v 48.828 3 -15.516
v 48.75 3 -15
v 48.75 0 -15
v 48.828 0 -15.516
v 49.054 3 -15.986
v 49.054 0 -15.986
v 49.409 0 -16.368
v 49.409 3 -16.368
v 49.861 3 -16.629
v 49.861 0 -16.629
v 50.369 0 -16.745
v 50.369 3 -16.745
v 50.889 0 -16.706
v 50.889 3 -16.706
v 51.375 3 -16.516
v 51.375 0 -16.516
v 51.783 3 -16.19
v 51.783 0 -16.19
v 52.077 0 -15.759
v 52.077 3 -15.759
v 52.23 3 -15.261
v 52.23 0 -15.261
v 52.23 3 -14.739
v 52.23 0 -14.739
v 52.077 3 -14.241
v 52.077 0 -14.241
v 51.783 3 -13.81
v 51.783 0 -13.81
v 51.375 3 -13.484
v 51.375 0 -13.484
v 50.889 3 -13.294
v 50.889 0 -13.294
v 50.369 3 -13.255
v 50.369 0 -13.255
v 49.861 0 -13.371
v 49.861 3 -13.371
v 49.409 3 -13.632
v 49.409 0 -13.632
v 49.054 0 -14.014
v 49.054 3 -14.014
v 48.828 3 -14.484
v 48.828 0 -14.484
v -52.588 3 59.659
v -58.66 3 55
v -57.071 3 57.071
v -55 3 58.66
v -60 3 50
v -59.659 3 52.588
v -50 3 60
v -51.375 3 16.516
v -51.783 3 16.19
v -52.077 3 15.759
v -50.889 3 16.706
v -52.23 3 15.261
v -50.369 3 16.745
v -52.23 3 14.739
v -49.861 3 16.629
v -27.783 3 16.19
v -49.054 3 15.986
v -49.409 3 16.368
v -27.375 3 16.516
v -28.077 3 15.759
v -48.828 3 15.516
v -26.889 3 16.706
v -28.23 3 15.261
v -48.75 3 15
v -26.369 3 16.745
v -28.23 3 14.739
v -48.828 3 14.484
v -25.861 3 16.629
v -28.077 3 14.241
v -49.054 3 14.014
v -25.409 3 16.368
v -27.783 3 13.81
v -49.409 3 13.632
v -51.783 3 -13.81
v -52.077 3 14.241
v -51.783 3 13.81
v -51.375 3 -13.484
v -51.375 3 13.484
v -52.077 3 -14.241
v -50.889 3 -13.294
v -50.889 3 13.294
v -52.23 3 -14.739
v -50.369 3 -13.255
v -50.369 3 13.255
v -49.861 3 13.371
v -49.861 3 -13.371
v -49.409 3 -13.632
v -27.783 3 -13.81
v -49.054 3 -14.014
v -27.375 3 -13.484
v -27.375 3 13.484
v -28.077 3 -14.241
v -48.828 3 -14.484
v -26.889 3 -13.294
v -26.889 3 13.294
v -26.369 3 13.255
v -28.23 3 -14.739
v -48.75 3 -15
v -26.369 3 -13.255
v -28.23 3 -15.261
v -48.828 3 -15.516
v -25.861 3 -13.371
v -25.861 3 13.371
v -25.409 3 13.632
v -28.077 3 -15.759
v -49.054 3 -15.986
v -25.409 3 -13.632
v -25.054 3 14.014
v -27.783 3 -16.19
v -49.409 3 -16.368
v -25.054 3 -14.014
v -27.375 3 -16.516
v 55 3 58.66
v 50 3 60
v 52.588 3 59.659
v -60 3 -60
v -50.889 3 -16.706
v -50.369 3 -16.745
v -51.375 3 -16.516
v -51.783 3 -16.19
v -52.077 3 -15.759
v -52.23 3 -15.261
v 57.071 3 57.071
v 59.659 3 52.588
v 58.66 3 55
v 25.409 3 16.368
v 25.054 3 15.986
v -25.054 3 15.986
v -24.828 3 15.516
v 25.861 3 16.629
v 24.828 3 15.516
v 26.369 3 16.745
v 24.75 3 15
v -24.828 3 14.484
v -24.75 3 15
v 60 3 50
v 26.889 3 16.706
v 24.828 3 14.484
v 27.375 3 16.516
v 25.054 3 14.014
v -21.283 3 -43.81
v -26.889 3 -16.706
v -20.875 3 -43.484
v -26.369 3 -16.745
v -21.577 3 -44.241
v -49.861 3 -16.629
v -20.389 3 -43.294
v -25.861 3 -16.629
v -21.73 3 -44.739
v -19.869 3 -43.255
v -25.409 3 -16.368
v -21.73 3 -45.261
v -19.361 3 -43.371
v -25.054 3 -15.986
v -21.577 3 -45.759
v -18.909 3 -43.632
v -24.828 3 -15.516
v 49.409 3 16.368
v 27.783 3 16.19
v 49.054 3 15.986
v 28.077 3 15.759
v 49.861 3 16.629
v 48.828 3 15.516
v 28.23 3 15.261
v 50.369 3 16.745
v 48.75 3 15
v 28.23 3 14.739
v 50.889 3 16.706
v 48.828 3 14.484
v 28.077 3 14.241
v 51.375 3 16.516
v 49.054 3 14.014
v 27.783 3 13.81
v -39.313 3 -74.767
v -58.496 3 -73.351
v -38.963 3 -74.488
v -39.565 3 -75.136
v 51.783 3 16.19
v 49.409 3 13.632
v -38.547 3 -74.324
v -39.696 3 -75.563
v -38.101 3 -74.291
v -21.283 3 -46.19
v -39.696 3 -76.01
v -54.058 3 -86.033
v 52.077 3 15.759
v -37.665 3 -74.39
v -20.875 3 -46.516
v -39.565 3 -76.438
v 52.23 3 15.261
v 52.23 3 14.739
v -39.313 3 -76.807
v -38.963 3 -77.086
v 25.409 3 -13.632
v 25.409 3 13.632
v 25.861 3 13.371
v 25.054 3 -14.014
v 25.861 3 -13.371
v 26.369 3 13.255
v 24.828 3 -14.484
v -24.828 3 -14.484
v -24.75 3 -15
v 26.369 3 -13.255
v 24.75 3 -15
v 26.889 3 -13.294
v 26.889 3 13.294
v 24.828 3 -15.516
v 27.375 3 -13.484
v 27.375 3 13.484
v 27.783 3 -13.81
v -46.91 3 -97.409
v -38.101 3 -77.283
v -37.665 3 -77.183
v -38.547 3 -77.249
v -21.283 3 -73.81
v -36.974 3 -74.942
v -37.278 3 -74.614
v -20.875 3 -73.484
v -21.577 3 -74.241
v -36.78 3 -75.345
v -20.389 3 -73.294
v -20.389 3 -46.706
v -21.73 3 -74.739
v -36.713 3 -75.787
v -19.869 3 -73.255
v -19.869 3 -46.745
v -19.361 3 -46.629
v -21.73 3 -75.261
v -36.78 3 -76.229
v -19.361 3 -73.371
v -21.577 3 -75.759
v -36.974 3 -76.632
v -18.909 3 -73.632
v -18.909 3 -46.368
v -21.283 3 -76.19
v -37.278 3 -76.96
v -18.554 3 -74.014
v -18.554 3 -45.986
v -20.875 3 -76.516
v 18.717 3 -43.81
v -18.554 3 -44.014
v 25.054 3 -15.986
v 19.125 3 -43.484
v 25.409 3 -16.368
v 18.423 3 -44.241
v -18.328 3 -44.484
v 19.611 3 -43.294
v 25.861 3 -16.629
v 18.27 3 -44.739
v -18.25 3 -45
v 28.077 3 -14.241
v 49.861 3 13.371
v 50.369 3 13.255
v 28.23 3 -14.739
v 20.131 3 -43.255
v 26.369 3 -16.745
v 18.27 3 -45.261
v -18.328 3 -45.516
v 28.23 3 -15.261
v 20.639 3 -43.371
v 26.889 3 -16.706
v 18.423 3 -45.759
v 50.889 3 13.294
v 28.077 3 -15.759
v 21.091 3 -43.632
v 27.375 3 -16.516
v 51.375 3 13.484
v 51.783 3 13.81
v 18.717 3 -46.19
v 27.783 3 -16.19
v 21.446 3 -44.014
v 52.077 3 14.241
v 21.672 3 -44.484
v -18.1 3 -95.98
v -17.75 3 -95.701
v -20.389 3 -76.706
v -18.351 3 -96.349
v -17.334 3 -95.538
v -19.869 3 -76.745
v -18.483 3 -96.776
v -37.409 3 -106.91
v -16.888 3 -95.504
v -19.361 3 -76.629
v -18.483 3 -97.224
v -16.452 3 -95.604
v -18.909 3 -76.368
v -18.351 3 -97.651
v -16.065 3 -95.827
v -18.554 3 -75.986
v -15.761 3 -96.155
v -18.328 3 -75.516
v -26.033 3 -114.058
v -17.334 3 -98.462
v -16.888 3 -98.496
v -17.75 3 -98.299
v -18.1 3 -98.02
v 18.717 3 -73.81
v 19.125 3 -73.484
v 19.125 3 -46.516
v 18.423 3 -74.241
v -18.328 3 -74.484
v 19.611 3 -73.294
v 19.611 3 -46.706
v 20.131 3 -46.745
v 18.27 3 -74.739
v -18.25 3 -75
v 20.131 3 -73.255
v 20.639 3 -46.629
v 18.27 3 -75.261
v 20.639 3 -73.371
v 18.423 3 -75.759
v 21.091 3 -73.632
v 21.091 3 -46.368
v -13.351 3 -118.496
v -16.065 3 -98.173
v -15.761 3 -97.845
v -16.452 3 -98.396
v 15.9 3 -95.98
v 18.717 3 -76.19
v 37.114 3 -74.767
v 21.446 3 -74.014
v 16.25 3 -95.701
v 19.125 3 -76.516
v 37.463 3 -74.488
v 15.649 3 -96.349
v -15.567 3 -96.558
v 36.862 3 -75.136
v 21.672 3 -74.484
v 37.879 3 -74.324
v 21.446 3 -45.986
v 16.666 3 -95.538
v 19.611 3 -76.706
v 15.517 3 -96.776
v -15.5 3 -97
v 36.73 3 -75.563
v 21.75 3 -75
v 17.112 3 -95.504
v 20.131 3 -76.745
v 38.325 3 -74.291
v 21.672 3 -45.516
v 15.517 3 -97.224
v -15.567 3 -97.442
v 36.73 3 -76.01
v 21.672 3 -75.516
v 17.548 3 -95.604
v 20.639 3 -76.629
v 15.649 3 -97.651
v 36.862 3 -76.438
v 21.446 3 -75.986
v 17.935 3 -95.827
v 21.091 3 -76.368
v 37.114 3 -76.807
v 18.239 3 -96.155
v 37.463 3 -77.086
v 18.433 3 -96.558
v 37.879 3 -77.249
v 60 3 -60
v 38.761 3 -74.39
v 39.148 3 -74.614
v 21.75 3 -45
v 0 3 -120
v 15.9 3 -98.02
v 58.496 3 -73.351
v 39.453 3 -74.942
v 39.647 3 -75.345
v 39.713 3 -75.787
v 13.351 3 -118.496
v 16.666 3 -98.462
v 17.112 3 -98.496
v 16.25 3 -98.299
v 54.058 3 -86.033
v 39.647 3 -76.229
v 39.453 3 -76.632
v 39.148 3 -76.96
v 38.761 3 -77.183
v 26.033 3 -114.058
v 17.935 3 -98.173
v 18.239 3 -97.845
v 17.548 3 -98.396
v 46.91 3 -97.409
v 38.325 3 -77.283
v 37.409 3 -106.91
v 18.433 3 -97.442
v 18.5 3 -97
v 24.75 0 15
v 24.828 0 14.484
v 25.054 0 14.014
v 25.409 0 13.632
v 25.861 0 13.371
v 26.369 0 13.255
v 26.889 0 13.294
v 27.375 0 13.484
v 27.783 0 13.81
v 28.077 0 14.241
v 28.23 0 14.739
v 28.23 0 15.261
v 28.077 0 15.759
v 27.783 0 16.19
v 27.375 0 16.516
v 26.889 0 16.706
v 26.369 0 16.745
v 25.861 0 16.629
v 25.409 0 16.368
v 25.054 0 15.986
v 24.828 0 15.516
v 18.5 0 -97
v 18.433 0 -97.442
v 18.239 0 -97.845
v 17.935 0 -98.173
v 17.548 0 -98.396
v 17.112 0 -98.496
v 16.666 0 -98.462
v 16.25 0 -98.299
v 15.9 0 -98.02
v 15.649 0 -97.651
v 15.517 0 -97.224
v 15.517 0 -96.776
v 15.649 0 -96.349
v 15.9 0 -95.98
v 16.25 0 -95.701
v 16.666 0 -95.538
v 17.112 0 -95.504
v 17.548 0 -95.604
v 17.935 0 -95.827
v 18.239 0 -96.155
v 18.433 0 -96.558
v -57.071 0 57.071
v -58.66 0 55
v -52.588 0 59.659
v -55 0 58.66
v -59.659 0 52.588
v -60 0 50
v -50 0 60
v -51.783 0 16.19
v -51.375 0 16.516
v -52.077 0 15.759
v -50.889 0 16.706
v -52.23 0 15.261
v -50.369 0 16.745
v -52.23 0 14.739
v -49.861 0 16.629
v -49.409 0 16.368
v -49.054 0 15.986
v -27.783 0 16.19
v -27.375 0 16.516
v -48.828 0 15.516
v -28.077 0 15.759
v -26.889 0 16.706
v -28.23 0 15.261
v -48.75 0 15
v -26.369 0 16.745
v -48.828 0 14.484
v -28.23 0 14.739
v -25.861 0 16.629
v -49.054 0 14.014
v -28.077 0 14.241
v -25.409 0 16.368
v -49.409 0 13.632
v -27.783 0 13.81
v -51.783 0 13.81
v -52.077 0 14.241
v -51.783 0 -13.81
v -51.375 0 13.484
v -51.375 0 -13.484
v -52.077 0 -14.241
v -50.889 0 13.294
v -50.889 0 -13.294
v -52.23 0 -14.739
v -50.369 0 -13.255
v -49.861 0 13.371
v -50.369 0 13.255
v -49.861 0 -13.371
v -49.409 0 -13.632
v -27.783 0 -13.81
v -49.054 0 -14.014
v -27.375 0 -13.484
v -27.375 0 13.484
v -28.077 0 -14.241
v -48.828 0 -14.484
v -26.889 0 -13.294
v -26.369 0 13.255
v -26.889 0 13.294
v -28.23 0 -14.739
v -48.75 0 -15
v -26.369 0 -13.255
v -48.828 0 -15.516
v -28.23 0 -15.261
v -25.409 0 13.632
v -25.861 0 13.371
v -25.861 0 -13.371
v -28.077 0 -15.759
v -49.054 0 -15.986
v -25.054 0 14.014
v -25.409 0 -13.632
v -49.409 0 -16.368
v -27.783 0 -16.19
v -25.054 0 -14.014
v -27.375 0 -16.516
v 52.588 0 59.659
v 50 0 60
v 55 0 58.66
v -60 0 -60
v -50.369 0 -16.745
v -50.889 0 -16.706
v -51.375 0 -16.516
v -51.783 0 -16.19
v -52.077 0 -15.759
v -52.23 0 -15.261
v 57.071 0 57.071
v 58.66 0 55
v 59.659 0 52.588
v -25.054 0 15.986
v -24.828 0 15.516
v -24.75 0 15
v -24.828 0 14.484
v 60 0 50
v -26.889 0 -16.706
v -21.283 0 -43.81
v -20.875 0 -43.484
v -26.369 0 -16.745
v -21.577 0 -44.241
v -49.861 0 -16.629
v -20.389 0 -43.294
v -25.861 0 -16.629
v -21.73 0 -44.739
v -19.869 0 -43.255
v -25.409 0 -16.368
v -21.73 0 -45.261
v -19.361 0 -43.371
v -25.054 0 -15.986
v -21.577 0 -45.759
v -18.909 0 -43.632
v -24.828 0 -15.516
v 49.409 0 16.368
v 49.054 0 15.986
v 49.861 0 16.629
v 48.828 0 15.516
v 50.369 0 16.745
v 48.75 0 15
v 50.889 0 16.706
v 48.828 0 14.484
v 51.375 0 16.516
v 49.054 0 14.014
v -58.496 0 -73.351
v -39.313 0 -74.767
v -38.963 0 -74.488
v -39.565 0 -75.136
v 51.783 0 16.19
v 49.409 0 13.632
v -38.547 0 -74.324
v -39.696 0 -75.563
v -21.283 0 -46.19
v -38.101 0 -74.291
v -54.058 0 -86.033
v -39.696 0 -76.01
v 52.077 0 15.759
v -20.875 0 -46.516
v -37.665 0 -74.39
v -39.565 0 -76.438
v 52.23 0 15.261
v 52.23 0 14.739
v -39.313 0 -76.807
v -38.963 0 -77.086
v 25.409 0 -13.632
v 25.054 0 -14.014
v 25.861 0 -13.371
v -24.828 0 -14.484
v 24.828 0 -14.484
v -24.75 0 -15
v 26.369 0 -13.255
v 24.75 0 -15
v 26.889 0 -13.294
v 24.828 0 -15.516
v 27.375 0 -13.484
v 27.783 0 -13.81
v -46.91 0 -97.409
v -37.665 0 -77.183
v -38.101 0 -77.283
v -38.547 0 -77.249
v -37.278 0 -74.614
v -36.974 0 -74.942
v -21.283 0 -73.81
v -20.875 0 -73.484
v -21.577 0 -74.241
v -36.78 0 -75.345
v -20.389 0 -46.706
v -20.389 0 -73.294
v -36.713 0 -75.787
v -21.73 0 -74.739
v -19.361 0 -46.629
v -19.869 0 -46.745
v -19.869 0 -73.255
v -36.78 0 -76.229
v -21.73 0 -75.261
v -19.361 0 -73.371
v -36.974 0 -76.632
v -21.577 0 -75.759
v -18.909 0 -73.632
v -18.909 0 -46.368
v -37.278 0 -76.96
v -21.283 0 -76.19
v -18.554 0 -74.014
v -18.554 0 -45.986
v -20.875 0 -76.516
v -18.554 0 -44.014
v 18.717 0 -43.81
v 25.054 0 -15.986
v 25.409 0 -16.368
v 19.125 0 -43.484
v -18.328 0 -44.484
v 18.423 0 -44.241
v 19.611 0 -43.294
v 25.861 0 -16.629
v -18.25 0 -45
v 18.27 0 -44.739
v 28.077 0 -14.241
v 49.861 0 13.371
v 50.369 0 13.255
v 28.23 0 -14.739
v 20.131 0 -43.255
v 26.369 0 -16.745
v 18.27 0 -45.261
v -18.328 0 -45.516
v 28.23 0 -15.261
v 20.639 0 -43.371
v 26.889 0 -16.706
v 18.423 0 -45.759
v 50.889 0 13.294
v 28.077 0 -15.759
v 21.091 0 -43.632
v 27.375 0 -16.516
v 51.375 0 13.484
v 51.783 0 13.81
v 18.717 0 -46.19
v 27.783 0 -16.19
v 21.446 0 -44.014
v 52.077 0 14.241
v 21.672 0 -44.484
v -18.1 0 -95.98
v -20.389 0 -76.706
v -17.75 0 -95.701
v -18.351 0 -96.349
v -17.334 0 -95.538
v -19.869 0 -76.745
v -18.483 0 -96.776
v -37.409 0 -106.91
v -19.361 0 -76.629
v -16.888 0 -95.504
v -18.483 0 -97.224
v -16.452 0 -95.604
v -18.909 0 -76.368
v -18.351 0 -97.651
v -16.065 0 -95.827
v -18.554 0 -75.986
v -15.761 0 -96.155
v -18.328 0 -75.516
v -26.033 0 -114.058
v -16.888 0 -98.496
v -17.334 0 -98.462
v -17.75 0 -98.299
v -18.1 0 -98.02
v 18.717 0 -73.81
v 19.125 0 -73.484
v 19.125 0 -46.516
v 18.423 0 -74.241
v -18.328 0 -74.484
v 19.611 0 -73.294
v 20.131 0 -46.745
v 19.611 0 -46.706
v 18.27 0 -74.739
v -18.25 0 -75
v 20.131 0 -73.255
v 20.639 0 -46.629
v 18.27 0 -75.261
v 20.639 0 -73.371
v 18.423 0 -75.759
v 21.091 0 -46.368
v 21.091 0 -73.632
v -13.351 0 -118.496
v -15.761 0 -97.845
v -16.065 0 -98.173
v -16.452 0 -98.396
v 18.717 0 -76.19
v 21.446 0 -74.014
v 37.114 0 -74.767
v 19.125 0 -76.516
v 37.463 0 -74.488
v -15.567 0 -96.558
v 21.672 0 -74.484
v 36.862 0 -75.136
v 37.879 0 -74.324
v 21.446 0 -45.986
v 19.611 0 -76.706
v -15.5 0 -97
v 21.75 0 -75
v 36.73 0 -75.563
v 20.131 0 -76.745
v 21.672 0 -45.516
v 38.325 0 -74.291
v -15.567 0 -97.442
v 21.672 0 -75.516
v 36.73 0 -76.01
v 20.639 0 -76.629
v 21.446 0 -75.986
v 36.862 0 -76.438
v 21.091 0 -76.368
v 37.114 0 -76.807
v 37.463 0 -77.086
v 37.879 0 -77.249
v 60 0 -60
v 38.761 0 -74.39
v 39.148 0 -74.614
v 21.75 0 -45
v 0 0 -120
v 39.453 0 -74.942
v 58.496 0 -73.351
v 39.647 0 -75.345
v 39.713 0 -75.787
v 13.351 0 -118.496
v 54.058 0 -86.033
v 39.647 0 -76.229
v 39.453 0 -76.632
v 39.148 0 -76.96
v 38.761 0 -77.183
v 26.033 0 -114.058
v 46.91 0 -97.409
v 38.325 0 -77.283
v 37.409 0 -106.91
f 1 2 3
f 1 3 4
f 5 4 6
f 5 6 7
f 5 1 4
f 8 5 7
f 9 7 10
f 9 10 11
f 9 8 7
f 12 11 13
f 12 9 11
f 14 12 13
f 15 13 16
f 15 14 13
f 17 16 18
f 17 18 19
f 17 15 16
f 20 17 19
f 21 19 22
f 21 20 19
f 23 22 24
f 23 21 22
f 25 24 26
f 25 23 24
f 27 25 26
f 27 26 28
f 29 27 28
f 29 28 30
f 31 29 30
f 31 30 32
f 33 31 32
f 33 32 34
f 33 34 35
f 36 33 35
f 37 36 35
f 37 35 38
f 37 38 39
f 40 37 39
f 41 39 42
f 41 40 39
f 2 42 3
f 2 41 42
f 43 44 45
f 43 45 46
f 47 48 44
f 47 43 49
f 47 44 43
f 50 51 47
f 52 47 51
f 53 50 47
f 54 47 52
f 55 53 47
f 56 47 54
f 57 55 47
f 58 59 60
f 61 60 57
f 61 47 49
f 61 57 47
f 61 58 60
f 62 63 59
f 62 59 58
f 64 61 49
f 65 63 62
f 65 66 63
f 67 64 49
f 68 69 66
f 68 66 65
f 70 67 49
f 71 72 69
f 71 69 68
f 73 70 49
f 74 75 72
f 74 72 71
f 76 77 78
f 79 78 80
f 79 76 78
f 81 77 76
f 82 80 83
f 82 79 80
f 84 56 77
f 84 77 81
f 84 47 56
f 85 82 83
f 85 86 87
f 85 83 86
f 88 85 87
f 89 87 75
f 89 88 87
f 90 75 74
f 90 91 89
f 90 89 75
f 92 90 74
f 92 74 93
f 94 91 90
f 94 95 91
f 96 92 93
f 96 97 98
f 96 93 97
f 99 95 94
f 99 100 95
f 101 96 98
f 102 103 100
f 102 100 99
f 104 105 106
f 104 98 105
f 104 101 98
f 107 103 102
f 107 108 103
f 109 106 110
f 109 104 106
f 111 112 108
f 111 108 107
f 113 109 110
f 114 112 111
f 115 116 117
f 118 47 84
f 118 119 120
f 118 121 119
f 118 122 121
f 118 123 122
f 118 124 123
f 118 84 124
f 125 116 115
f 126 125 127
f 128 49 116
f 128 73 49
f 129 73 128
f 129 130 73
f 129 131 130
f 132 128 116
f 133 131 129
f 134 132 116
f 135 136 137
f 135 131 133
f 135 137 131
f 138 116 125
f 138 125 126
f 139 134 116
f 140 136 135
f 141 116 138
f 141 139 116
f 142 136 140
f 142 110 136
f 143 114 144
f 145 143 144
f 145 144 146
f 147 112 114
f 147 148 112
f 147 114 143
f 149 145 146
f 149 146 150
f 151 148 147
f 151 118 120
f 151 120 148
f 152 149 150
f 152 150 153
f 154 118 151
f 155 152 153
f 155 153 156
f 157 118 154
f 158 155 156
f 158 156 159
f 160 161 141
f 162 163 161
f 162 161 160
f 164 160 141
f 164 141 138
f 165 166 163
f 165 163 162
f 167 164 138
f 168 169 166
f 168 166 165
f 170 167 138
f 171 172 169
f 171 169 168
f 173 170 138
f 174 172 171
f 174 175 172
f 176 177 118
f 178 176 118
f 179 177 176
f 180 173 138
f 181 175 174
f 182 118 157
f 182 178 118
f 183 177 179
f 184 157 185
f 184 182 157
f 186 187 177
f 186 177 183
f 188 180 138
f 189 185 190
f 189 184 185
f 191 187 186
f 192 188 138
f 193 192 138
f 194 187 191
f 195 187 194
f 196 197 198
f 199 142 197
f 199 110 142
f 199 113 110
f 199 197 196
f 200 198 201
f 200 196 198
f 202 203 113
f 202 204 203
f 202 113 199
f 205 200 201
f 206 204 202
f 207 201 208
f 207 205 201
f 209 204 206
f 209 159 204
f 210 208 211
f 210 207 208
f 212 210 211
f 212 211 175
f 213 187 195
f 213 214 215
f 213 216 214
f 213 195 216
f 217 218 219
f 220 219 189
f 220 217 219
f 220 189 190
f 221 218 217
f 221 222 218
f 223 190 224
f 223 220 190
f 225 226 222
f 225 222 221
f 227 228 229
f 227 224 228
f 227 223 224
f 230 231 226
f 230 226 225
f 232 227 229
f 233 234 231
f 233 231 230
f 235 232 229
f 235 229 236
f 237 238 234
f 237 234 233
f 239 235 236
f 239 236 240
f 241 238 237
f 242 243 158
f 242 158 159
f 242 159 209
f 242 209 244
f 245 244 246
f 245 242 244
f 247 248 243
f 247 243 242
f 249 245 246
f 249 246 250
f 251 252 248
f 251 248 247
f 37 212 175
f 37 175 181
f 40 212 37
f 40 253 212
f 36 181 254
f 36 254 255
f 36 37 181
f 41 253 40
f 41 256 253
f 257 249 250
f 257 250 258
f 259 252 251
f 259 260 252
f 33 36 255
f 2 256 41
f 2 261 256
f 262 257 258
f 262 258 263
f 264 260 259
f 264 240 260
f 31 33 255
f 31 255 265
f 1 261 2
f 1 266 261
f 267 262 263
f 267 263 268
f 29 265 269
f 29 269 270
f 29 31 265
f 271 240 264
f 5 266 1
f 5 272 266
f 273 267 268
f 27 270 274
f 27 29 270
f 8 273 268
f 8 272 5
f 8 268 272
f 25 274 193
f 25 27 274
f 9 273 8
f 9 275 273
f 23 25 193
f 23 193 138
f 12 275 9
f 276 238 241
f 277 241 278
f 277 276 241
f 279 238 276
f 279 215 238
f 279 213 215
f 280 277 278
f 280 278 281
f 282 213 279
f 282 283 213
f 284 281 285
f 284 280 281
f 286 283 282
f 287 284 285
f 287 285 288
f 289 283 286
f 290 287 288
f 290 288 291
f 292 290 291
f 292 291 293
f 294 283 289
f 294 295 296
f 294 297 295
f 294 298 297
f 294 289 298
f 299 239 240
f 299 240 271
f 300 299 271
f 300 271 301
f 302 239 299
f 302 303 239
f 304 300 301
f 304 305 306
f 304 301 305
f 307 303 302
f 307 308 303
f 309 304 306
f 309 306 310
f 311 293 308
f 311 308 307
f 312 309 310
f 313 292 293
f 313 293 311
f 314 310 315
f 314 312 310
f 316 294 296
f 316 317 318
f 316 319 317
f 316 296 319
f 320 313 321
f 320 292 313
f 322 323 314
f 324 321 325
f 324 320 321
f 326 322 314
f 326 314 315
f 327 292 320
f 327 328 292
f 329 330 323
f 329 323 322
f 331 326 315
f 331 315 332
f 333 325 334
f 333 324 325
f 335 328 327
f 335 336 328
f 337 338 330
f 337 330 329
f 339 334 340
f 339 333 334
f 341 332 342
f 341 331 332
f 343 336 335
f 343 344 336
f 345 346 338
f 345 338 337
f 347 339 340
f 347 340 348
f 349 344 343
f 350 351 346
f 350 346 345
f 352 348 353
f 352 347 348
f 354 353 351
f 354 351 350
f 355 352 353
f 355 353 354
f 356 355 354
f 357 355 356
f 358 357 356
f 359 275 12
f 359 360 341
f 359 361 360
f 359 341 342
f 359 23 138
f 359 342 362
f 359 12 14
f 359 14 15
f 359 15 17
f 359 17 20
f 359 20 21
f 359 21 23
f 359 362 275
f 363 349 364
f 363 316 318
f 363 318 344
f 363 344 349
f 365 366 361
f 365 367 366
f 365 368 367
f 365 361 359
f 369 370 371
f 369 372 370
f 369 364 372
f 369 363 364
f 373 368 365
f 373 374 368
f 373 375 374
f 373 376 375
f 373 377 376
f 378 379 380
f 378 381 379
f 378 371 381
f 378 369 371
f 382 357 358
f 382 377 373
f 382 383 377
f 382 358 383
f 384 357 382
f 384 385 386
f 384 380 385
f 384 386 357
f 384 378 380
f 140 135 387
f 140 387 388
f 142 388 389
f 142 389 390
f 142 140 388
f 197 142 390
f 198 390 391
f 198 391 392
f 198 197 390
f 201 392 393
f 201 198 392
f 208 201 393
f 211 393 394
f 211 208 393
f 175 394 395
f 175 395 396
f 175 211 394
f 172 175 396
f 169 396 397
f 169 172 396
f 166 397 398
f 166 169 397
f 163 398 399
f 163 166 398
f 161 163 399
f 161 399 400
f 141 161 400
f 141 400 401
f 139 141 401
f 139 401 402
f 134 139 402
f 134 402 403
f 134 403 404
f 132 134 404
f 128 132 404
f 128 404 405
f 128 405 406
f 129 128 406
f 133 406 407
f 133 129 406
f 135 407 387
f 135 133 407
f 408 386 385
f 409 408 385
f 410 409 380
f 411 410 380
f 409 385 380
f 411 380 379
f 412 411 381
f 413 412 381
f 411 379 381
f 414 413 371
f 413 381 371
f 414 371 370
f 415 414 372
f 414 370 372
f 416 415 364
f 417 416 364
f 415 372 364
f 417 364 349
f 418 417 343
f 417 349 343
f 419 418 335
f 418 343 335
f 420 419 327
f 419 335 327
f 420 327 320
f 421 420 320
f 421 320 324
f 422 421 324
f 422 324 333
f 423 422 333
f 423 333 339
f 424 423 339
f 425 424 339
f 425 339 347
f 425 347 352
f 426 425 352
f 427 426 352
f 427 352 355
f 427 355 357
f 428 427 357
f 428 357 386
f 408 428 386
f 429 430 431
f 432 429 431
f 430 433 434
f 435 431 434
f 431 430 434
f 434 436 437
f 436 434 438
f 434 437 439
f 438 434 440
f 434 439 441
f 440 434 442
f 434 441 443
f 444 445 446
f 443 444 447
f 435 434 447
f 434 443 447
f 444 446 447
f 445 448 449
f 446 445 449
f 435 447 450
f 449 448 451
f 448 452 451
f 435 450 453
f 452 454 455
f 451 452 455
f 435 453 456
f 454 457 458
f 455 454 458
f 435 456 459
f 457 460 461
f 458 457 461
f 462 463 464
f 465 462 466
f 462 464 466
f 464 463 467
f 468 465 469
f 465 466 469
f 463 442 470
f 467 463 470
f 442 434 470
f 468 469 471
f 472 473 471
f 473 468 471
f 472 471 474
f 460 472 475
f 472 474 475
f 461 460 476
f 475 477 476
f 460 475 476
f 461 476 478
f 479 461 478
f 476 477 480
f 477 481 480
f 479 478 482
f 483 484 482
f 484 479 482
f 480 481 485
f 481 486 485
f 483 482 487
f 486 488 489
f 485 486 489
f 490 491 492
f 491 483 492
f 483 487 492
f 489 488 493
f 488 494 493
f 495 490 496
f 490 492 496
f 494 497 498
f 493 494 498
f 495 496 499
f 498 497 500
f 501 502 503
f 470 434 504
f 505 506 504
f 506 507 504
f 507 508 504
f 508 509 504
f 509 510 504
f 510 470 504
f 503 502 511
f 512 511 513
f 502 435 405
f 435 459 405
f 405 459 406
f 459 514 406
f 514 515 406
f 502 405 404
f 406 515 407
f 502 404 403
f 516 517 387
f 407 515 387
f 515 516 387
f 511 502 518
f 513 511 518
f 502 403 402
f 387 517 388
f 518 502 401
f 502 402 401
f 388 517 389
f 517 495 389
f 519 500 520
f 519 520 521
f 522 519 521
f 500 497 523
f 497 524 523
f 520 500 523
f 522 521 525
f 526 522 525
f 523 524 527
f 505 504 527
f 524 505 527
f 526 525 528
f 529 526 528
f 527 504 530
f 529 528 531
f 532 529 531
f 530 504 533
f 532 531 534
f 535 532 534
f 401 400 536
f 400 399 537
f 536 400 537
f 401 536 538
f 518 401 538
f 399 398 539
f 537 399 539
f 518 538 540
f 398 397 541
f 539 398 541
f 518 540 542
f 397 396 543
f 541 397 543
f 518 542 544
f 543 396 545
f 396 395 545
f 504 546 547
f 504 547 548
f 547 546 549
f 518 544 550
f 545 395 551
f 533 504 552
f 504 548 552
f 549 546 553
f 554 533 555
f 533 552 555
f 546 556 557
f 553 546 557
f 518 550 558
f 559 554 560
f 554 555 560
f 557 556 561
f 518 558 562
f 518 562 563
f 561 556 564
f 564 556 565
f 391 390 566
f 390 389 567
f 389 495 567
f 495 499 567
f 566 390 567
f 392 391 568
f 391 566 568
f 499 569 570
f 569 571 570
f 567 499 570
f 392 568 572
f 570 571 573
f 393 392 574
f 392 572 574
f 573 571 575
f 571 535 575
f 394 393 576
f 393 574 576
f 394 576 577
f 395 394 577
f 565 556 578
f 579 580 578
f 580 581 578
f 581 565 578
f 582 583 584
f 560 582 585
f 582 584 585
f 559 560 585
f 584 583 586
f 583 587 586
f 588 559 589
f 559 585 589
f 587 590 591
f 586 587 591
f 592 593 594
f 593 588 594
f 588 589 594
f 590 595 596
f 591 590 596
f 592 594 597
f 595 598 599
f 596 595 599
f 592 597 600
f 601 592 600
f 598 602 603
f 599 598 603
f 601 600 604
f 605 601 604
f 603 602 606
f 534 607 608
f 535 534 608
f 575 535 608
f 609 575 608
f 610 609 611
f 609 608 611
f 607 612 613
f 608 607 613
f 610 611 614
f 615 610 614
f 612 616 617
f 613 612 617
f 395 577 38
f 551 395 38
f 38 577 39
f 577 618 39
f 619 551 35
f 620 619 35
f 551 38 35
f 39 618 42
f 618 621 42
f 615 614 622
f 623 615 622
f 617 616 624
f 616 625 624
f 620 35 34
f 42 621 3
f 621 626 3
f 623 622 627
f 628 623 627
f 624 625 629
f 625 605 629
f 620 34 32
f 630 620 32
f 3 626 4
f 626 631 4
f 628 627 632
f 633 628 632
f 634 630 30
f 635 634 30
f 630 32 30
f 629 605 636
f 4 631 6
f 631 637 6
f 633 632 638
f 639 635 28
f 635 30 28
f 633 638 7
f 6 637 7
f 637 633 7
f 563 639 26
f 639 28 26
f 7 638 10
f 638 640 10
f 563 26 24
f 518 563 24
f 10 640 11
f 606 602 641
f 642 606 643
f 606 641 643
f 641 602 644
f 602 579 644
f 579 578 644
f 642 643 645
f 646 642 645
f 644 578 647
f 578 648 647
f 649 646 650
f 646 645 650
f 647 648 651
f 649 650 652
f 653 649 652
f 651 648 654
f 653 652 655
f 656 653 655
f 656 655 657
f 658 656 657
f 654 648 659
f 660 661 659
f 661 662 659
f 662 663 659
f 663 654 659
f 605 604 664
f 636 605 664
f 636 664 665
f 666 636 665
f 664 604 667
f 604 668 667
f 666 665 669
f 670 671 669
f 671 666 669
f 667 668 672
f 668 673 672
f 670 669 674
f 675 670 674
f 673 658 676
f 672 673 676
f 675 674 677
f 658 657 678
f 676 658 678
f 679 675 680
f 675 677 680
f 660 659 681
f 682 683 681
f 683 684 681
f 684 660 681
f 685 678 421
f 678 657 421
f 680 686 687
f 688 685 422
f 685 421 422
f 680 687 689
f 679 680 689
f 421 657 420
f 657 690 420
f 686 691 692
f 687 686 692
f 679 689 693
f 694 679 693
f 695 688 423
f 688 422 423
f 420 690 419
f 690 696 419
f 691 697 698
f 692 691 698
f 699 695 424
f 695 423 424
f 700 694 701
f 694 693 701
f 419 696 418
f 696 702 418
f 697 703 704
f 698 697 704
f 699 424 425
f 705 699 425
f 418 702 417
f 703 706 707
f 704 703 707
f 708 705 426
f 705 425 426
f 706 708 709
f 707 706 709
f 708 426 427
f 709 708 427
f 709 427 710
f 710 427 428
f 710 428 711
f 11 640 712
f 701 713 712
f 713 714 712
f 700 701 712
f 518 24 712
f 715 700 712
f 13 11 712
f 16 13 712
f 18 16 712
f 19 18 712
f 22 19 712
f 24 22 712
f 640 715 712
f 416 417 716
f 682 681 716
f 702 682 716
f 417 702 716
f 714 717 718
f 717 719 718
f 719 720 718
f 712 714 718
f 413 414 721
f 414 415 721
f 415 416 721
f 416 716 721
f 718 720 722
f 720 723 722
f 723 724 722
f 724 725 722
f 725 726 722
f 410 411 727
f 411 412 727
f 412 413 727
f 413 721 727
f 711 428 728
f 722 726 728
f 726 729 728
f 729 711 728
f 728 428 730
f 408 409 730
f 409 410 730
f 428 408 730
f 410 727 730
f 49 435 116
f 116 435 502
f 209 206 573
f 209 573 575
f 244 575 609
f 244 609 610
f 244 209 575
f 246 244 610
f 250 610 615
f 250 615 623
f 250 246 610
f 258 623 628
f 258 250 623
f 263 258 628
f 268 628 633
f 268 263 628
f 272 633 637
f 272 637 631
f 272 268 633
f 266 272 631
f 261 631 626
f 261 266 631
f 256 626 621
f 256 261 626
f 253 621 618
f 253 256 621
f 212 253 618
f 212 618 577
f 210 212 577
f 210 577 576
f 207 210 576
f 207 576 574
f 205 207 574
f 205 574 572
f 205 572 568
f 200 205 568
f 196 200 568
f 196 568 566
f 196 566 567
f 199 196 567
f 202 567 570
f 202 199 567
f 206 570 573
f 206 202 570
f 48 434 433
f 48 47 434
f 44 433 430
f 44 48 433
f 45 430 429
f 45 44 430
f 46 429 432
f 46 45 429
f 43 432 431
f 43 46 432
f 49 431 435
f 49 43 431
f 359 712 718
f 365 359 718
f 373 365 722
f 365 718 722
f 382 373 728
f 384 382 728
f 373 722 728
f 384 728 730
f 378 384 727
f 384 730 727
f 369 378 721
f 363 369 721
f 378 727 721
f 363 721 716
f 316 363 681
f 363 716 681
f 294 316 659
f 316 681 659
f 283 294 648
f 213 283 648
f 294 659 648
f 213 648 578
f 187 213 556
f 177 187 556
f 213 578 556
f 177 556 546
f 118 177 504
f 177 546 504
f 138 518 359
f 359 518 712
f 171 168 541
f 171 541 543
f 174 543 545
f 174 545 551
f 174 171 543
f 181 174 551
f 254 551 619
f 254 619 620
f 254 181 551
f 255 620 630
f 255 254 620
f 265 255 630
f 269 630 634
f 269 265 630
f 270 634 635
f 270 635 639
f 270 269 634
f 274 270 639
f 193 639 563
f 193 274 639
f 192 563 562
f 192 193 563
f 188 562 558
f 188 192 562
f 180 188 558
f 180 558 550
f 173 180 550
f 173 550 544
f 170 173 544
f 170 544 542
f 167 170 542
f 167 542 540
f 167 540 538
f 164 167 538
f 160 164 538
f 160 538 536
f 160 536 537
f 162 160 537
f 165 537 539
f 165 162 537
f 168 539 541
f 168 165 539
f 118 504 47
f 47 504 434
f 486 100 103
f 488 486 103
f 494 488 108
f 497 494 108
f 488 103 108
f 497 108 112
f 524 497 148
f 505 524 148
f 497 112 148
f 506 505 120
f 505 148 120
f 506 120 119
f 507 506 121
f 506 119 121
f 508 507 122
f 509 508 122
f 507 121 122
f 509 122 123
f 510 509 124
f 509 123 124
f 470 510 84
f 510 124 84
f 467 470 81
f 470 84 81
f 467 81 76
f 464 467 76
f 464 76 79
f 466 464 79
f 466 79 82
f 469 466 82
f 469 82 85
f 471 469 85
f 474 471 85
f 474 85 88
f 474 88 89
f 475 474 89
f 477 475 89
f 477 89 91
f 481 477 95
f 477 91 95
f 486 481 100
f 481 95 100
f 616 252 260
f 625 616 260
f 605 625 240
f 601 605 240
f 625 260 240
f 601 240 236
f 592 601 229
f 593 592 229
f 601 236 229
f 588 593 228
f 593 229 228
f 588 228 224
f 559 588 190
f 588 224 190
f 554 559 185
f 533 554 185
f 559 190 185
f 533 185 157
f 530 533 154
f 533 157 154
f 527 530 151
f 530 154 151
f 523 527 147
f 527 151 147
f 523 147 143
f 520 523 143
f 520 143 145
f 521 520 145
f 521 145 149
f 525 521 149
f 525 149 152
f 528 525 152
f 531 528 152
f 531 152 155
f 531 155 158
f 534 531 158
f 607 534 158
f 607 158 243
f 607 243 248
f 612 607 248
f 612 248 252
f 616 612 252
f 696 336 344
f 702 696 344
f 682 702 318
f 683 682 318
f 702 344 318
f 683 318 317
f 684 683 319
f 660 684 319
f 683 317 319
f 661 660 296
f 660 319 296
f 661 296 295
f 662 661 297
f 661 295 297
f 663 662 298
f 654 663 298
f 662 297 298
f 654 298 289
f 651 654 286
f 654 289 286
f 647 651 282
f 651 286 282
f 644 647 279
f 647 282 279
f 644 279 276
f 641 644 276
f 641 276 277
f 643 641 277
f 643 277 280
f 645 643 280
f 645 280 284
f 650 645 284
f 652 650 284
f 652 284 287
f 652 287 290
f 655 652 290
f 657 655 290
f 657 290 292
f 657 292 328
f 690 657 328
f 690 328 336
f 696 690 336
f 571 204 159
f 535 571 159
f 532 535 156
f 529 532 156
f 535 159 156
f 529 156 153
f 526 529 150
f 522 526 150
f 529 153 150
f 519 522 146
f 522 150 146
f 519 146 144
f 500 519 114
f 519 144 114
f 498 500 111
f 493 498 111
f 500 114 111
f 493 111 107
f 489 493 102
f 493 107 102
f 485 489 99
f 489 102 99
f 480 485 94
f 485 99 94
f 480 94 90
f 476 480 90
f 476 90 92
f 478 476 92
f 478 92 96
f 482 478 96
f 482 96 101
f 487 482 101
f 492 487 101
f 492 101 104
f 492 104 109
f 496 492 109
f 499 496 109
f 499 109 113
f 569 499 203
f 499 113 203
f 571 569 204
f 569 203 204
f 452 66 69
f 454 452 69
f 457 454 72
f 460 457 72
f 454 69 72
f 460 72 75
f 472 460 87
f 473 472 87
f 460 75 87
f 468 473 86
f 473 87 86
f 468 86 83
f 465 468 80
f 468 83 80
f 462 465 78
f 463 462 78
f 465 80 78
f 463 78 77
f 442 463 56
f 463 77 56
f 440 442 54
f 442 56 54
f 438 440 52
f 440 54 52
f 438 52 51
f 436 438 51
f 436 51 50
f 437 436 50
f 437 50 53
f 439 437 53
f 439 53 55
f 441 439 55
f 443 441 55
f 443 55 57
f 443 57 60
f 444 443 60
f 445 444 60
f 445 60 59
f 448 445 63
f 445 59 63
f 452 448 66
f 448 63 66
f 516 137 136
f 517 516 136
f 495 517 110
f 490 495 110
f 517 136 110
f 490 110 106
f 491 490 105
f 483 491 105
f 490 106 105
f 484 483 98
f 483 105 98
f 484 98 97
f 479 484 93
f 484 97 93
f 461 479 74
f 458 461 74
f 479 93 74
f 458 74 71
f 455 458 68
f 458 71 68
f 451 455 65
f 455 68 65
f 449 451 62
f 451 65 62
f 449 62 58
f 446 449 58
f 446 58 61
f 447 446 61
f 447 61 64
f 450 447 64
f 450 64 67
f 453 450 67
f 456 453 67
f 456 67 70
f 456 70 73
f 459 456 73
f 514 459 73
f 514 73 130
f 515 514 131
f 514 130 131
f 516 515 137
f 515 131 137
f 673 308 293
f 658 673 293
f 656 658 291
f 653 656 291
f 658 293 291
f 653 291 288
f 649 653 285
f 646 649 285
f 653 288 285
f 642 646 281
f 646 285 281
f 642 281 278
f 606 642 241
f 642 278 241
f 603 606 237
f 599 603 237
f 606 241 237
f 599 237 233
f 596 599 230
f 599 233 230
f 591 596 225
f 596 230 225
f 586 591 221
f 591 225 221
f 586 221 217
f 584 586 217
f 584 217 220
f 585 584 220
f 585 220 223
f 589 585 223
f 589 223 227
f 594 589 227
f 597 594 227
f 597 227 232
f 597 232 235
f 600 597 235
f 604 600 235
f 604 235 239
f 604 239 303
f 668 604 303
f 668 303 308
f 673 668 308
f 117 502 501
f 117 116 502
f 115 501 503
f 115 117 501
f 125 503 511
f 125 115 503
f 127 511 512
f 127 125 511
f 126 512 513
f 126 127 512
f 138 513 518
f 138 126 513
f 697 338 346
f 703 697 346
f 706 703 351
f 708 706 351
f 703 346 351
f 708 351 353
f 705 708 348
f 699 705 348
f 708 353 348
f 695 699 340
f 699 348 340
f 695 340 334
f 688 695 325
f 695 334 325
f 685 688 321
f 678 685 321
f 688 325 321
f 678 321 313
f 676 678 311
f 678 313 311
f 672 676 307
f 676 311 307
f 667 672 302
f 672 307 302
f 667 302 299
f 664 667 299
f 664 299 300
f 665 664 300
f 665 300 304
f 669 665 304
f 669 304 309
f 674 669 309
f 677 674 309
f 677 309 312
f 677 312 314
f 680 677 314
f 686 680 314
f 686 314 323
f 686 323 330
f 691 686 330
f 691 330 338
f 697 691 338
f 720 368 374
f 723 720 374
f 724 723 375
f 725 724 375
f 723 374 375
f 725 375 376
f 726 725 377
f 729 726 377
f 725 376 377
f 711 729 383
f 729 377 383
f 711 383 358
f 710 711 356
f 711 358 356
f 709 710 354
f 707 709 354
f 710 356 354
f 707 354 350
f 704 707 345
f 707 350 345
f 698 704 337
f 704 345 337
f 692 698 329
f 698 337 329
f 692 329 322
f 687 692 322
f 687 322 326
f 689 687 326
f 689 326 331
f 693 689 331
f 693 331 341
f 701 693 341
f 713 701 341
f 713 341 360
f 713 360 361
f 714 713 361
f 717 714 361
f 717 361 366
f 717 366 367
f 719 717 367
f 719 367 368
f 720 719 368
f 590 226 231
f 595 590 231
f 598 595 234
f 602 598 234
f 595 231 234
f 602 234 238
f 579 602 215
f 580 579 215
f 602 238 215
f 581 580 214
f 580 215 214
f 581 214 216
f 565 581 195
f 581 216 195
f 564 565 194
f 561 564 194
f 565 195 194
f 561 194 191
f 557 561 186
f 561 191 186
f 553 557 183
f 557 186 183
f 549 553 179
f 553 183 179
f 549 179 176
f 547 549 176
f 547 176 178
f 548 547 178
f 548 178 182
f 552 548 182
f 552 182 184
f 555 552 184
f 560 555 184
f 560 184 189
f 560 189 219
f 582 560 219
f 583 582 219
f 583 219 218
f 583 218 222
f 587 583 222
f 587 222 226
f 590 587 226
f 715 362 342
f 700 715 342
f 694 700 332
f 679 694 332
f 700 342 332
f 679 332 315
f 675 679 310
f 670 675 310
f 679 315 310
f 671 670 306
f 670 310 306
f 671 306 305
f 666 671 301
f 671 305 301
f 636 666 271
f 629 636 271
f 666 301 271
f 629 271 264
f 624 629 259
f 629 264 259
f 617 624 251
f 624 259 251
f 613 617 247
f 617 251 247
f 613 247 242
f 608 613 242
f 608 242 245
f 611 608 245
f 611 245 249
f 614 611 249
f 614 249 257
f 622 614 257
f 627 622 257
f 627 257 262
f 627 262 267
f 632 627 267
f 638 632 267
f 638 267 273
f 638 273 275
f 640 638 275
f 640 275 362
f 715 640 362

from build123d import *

# Parameters (mm, degrees)
BOSS_EXTRUDE3_DEPTH = 3
FILLET3_R           = 10
SKETCH4_R           = 1.75
CUT_EXTRUDE1_DEPTH  = 3
CUT_EXTRUDE2_REACH  = 5
SKETCH5_R           = 1.75
CUT_EXTRUDE3_REACH  = 5
SKETCH6_R           = 1.5


with BuildPart() as part:
    # Sketch1 → Boss-Extrude3 (new body)
    with BuildSketch(Plane(origin=(0, 0, 0), x_dir=(1, 0, 0), z_dir=(0, 1, 0))):
        with BuildLine():
            Line((-60, 60), (-60, -60))
            Line((-60, -60), (60, -60))
            Line((60, -60), (60, 60))
            ThreePointArc((60, 60), (0, 120), (-60, 60))
        make_face()
    extrude(amount=BOSS_EXTRUDE3_DEPTH)

    # Fillet3
    fillet3_edges = [part.edges().sort_by_distance(p)[0] for p in [
        (60, 1.5, 60),
        (-60, 1.5, 60),
    ]]
    fillet(fillet3_edges, radius=FILLET3_R)

    # Sketch4 → Cut-Extrude1 (cut)
    with BuildSketch(Plane(origin=(0, 3, 0), x_dir=(1, 0, 0), z_dir=(0, 1, 0))):
        with Locations((-26.5, -15)):
            Circle(SKETCH4_R)
        with Locations((-50.5, -15)):
            Circle(SKETCH4_R)
        with Locations((-50.5, 15)):
            Circle(SKETCH4_R)
        with Locations((-26.5, 15)):
            Circle(SKETCH4_R)
    cut_extrude1 = extrude(amount=-CUT_EXTRUDE1_DEPTH, mode=Mode.SUBTRACT)

    # Mirror1: Cut-Extrude1 across plane
    add(cut_extrude1.mirror(Plane(origin=(0, 0, 0), x_dir=(0, 0, 1), z_dir=(1, 0, 0))), mode=Mode.SUBTRACT)

    # Sketch5 → Cut-Extrude2 (cut, up to next)
    with BuildSketch(Plane(origin=(0, 3, 0), x_dir=(1, 0, 0), z_dir=(0, 1, 0)), mode=Mode.PRIVATE) as cut_extrude2_sk1:
        with Locations((20, 75)):
            Circle(SKETCH5_R)
    cut_extrude2_tool1 = extrude(cut_extrude2_sk1.sketch, amount=-CUT_EXTRUDE2_REACH, mode=Mode.PRIVATE) & part.part
    add(cut_extrude2_tool1.solids().sort_by_distance((20, 3, -75))[0], mode=Mode.SUBTRACT)
    # Sketch5 → Cut-Extrude2 (cut, up to next)
    with BuildSketch(Plane(origin=(0, 3, 0), x_dir=(1, 0, 0), z_dir=(0, 1, 0)), mode=Mode.PRIVATE) as cut_extrude2_sk2:
        with Locations((-20, 75)):
            Circle(SKETCH5_R)
    cut_extrude2_tool2 = extrude(cut_extrude2_sk2.sketch, amount=-CUT_EXTRUDE2_REACH, mode=Mode.PRIVATE) & part.part
    add(cut_extrude2_tool2.solids().sort_by_distance((-20, 3, -75))[0], mode=Mode.SUBTRACT)
    # Sketch5 → Cut-Extrude2 (cut, up to next)
    with BuildSketch(Plane(origin=(0, 3, 0), x_dir=(1, 0, 0), z_dir=(0, 1, 0)), mode=Mode.PRIVATE) as cut_extrude2_sk3:
        with Locations((-20, 45)):
            Circle(SKETCH5_R)
    cut_extrude2_tool3 = extrude(cut_extrude2_sk3.sketch, amount=-CUT_EXTRUDE2_REACH, mode=Mode.PRIVATE) & part.part
    add(cut_extrude2_tool3.solids().sort_by_distance((-20, 3, -45))[0], mode=Mode.SUBTRACT)
    # Sketch5 → Cut-Extrude2 (cut, up to next)
    with BuildSketch(Plane(origin=(0, 3, 0), x_dir=(1, 0, 0), z_dir=(0, 1, 0)), mode=Mode.PRIVATE) as cut_extrude2_sk4:
        with Locations((20, 45)):
            Circle(SKETCH5_R)
    cut_extrude2_tool4 = extrude(cut_extrude2_sk4.sketch, amount=-CUT_EXTRUDE2_REACH, mode=Mode.PRIVATE) & part.part
    add(cut_extrude2_tool4.solids().sort_by_distance((20, 3, -45))[0], mode=Mode.SUBTRACT)

    # Sketch6 → Cut-Extrude3 (cut, up to next)
    with BuildSketch(Plane(origin=(0, 3, 0), x_dir=(1, 0, 0), z_dir=(0, 1, 0)), mode=Mode.PRIVATE) as cut_extrude3_sk1:
        with Locations((-38.213203436, 75.786796564)):
            Circle(SKETCH6_R)
    cut_extrude3_tool1 = extrude(cut_extrude3_sk1.sketch, amount=-CUT_EXTRUDE3_REACH, mode=Mode.PRIVATE) & part.part
    add(cut_extrude3_tool1.solids().sort_by_distance((-38.213203, 3, -75.786797))[0], mode=Mode.SUBTRACT)
    # Sketch6 → Cut-Extrude3 (cut, up to next)
    with BuildSketch(Plane(origin=(0, 3, 0), x_dir=(1, 0, 0), z_dir=(0, 1, 0)), mode=Mode.PRIVATE) as cut_extrude3_sk2:
        with Locations((-17, 97)):
            Circle(SKETCH6_R)
    cut_extrude3_tool2 = extrude(cut_extrude3_sk2.sketch, amount=-CUT_EXTRUDE3_REACH, mode=Mode.PRIVATE) & part.part
    add(cut_extrude3_tool2.solids().sort_by_distance((-17, 3, -97))[0], mode=Mode.SUBTRACT)
    # Sketch6 → Cut-Extrude3 (cut, up to next)
    with BuildSketch(Plane(origin=(0, 3, 0), x_dir=(1, 0, 0), z_dir=(0, 1, 0)), mode=Mode.PRIVATE) as cut_extrude3_sk3:
        with Locations((17, 97)):
            Circle(SKETCH6_R)
    cut_extrude3_tool3 = extrude(cut_extrude3_sk3.sketch, amount=-CUT_EXTRUDE3_REACH, mode=Mode.PRIVATE) & part.part
    add(cut_extrude3_tool3.solids().sort_by_distance((17, 3, -97))[0], mode=Mode.SUBTRACT)
    # Sketch6 → Cut-Extrude3 (cut, up to next)
    with BuildSketch(Plane(origin=(0, 3, 0), x_dir=(1, 0, 0), z_dir=(0, 1, 0)), mode=Mode.PRIVATE) as cut_extrude3_sk4:
        with Locations((38.213203436, 75.786796564)):
            Circle(SKETCH6_R)
    cut_extrude3_tool4 = extrude(cut_extrude3_sk4.sketch, amount=-CUT_EXTRUDE3_REACH, mode=Mode.PRIVATE) & part.part
    add(cut_extrude3_tool4.solids().sort_by_distance((38.213203, 3, -75.786797))[0], mode=Mode.SUBTRACT)


solid = part.part
